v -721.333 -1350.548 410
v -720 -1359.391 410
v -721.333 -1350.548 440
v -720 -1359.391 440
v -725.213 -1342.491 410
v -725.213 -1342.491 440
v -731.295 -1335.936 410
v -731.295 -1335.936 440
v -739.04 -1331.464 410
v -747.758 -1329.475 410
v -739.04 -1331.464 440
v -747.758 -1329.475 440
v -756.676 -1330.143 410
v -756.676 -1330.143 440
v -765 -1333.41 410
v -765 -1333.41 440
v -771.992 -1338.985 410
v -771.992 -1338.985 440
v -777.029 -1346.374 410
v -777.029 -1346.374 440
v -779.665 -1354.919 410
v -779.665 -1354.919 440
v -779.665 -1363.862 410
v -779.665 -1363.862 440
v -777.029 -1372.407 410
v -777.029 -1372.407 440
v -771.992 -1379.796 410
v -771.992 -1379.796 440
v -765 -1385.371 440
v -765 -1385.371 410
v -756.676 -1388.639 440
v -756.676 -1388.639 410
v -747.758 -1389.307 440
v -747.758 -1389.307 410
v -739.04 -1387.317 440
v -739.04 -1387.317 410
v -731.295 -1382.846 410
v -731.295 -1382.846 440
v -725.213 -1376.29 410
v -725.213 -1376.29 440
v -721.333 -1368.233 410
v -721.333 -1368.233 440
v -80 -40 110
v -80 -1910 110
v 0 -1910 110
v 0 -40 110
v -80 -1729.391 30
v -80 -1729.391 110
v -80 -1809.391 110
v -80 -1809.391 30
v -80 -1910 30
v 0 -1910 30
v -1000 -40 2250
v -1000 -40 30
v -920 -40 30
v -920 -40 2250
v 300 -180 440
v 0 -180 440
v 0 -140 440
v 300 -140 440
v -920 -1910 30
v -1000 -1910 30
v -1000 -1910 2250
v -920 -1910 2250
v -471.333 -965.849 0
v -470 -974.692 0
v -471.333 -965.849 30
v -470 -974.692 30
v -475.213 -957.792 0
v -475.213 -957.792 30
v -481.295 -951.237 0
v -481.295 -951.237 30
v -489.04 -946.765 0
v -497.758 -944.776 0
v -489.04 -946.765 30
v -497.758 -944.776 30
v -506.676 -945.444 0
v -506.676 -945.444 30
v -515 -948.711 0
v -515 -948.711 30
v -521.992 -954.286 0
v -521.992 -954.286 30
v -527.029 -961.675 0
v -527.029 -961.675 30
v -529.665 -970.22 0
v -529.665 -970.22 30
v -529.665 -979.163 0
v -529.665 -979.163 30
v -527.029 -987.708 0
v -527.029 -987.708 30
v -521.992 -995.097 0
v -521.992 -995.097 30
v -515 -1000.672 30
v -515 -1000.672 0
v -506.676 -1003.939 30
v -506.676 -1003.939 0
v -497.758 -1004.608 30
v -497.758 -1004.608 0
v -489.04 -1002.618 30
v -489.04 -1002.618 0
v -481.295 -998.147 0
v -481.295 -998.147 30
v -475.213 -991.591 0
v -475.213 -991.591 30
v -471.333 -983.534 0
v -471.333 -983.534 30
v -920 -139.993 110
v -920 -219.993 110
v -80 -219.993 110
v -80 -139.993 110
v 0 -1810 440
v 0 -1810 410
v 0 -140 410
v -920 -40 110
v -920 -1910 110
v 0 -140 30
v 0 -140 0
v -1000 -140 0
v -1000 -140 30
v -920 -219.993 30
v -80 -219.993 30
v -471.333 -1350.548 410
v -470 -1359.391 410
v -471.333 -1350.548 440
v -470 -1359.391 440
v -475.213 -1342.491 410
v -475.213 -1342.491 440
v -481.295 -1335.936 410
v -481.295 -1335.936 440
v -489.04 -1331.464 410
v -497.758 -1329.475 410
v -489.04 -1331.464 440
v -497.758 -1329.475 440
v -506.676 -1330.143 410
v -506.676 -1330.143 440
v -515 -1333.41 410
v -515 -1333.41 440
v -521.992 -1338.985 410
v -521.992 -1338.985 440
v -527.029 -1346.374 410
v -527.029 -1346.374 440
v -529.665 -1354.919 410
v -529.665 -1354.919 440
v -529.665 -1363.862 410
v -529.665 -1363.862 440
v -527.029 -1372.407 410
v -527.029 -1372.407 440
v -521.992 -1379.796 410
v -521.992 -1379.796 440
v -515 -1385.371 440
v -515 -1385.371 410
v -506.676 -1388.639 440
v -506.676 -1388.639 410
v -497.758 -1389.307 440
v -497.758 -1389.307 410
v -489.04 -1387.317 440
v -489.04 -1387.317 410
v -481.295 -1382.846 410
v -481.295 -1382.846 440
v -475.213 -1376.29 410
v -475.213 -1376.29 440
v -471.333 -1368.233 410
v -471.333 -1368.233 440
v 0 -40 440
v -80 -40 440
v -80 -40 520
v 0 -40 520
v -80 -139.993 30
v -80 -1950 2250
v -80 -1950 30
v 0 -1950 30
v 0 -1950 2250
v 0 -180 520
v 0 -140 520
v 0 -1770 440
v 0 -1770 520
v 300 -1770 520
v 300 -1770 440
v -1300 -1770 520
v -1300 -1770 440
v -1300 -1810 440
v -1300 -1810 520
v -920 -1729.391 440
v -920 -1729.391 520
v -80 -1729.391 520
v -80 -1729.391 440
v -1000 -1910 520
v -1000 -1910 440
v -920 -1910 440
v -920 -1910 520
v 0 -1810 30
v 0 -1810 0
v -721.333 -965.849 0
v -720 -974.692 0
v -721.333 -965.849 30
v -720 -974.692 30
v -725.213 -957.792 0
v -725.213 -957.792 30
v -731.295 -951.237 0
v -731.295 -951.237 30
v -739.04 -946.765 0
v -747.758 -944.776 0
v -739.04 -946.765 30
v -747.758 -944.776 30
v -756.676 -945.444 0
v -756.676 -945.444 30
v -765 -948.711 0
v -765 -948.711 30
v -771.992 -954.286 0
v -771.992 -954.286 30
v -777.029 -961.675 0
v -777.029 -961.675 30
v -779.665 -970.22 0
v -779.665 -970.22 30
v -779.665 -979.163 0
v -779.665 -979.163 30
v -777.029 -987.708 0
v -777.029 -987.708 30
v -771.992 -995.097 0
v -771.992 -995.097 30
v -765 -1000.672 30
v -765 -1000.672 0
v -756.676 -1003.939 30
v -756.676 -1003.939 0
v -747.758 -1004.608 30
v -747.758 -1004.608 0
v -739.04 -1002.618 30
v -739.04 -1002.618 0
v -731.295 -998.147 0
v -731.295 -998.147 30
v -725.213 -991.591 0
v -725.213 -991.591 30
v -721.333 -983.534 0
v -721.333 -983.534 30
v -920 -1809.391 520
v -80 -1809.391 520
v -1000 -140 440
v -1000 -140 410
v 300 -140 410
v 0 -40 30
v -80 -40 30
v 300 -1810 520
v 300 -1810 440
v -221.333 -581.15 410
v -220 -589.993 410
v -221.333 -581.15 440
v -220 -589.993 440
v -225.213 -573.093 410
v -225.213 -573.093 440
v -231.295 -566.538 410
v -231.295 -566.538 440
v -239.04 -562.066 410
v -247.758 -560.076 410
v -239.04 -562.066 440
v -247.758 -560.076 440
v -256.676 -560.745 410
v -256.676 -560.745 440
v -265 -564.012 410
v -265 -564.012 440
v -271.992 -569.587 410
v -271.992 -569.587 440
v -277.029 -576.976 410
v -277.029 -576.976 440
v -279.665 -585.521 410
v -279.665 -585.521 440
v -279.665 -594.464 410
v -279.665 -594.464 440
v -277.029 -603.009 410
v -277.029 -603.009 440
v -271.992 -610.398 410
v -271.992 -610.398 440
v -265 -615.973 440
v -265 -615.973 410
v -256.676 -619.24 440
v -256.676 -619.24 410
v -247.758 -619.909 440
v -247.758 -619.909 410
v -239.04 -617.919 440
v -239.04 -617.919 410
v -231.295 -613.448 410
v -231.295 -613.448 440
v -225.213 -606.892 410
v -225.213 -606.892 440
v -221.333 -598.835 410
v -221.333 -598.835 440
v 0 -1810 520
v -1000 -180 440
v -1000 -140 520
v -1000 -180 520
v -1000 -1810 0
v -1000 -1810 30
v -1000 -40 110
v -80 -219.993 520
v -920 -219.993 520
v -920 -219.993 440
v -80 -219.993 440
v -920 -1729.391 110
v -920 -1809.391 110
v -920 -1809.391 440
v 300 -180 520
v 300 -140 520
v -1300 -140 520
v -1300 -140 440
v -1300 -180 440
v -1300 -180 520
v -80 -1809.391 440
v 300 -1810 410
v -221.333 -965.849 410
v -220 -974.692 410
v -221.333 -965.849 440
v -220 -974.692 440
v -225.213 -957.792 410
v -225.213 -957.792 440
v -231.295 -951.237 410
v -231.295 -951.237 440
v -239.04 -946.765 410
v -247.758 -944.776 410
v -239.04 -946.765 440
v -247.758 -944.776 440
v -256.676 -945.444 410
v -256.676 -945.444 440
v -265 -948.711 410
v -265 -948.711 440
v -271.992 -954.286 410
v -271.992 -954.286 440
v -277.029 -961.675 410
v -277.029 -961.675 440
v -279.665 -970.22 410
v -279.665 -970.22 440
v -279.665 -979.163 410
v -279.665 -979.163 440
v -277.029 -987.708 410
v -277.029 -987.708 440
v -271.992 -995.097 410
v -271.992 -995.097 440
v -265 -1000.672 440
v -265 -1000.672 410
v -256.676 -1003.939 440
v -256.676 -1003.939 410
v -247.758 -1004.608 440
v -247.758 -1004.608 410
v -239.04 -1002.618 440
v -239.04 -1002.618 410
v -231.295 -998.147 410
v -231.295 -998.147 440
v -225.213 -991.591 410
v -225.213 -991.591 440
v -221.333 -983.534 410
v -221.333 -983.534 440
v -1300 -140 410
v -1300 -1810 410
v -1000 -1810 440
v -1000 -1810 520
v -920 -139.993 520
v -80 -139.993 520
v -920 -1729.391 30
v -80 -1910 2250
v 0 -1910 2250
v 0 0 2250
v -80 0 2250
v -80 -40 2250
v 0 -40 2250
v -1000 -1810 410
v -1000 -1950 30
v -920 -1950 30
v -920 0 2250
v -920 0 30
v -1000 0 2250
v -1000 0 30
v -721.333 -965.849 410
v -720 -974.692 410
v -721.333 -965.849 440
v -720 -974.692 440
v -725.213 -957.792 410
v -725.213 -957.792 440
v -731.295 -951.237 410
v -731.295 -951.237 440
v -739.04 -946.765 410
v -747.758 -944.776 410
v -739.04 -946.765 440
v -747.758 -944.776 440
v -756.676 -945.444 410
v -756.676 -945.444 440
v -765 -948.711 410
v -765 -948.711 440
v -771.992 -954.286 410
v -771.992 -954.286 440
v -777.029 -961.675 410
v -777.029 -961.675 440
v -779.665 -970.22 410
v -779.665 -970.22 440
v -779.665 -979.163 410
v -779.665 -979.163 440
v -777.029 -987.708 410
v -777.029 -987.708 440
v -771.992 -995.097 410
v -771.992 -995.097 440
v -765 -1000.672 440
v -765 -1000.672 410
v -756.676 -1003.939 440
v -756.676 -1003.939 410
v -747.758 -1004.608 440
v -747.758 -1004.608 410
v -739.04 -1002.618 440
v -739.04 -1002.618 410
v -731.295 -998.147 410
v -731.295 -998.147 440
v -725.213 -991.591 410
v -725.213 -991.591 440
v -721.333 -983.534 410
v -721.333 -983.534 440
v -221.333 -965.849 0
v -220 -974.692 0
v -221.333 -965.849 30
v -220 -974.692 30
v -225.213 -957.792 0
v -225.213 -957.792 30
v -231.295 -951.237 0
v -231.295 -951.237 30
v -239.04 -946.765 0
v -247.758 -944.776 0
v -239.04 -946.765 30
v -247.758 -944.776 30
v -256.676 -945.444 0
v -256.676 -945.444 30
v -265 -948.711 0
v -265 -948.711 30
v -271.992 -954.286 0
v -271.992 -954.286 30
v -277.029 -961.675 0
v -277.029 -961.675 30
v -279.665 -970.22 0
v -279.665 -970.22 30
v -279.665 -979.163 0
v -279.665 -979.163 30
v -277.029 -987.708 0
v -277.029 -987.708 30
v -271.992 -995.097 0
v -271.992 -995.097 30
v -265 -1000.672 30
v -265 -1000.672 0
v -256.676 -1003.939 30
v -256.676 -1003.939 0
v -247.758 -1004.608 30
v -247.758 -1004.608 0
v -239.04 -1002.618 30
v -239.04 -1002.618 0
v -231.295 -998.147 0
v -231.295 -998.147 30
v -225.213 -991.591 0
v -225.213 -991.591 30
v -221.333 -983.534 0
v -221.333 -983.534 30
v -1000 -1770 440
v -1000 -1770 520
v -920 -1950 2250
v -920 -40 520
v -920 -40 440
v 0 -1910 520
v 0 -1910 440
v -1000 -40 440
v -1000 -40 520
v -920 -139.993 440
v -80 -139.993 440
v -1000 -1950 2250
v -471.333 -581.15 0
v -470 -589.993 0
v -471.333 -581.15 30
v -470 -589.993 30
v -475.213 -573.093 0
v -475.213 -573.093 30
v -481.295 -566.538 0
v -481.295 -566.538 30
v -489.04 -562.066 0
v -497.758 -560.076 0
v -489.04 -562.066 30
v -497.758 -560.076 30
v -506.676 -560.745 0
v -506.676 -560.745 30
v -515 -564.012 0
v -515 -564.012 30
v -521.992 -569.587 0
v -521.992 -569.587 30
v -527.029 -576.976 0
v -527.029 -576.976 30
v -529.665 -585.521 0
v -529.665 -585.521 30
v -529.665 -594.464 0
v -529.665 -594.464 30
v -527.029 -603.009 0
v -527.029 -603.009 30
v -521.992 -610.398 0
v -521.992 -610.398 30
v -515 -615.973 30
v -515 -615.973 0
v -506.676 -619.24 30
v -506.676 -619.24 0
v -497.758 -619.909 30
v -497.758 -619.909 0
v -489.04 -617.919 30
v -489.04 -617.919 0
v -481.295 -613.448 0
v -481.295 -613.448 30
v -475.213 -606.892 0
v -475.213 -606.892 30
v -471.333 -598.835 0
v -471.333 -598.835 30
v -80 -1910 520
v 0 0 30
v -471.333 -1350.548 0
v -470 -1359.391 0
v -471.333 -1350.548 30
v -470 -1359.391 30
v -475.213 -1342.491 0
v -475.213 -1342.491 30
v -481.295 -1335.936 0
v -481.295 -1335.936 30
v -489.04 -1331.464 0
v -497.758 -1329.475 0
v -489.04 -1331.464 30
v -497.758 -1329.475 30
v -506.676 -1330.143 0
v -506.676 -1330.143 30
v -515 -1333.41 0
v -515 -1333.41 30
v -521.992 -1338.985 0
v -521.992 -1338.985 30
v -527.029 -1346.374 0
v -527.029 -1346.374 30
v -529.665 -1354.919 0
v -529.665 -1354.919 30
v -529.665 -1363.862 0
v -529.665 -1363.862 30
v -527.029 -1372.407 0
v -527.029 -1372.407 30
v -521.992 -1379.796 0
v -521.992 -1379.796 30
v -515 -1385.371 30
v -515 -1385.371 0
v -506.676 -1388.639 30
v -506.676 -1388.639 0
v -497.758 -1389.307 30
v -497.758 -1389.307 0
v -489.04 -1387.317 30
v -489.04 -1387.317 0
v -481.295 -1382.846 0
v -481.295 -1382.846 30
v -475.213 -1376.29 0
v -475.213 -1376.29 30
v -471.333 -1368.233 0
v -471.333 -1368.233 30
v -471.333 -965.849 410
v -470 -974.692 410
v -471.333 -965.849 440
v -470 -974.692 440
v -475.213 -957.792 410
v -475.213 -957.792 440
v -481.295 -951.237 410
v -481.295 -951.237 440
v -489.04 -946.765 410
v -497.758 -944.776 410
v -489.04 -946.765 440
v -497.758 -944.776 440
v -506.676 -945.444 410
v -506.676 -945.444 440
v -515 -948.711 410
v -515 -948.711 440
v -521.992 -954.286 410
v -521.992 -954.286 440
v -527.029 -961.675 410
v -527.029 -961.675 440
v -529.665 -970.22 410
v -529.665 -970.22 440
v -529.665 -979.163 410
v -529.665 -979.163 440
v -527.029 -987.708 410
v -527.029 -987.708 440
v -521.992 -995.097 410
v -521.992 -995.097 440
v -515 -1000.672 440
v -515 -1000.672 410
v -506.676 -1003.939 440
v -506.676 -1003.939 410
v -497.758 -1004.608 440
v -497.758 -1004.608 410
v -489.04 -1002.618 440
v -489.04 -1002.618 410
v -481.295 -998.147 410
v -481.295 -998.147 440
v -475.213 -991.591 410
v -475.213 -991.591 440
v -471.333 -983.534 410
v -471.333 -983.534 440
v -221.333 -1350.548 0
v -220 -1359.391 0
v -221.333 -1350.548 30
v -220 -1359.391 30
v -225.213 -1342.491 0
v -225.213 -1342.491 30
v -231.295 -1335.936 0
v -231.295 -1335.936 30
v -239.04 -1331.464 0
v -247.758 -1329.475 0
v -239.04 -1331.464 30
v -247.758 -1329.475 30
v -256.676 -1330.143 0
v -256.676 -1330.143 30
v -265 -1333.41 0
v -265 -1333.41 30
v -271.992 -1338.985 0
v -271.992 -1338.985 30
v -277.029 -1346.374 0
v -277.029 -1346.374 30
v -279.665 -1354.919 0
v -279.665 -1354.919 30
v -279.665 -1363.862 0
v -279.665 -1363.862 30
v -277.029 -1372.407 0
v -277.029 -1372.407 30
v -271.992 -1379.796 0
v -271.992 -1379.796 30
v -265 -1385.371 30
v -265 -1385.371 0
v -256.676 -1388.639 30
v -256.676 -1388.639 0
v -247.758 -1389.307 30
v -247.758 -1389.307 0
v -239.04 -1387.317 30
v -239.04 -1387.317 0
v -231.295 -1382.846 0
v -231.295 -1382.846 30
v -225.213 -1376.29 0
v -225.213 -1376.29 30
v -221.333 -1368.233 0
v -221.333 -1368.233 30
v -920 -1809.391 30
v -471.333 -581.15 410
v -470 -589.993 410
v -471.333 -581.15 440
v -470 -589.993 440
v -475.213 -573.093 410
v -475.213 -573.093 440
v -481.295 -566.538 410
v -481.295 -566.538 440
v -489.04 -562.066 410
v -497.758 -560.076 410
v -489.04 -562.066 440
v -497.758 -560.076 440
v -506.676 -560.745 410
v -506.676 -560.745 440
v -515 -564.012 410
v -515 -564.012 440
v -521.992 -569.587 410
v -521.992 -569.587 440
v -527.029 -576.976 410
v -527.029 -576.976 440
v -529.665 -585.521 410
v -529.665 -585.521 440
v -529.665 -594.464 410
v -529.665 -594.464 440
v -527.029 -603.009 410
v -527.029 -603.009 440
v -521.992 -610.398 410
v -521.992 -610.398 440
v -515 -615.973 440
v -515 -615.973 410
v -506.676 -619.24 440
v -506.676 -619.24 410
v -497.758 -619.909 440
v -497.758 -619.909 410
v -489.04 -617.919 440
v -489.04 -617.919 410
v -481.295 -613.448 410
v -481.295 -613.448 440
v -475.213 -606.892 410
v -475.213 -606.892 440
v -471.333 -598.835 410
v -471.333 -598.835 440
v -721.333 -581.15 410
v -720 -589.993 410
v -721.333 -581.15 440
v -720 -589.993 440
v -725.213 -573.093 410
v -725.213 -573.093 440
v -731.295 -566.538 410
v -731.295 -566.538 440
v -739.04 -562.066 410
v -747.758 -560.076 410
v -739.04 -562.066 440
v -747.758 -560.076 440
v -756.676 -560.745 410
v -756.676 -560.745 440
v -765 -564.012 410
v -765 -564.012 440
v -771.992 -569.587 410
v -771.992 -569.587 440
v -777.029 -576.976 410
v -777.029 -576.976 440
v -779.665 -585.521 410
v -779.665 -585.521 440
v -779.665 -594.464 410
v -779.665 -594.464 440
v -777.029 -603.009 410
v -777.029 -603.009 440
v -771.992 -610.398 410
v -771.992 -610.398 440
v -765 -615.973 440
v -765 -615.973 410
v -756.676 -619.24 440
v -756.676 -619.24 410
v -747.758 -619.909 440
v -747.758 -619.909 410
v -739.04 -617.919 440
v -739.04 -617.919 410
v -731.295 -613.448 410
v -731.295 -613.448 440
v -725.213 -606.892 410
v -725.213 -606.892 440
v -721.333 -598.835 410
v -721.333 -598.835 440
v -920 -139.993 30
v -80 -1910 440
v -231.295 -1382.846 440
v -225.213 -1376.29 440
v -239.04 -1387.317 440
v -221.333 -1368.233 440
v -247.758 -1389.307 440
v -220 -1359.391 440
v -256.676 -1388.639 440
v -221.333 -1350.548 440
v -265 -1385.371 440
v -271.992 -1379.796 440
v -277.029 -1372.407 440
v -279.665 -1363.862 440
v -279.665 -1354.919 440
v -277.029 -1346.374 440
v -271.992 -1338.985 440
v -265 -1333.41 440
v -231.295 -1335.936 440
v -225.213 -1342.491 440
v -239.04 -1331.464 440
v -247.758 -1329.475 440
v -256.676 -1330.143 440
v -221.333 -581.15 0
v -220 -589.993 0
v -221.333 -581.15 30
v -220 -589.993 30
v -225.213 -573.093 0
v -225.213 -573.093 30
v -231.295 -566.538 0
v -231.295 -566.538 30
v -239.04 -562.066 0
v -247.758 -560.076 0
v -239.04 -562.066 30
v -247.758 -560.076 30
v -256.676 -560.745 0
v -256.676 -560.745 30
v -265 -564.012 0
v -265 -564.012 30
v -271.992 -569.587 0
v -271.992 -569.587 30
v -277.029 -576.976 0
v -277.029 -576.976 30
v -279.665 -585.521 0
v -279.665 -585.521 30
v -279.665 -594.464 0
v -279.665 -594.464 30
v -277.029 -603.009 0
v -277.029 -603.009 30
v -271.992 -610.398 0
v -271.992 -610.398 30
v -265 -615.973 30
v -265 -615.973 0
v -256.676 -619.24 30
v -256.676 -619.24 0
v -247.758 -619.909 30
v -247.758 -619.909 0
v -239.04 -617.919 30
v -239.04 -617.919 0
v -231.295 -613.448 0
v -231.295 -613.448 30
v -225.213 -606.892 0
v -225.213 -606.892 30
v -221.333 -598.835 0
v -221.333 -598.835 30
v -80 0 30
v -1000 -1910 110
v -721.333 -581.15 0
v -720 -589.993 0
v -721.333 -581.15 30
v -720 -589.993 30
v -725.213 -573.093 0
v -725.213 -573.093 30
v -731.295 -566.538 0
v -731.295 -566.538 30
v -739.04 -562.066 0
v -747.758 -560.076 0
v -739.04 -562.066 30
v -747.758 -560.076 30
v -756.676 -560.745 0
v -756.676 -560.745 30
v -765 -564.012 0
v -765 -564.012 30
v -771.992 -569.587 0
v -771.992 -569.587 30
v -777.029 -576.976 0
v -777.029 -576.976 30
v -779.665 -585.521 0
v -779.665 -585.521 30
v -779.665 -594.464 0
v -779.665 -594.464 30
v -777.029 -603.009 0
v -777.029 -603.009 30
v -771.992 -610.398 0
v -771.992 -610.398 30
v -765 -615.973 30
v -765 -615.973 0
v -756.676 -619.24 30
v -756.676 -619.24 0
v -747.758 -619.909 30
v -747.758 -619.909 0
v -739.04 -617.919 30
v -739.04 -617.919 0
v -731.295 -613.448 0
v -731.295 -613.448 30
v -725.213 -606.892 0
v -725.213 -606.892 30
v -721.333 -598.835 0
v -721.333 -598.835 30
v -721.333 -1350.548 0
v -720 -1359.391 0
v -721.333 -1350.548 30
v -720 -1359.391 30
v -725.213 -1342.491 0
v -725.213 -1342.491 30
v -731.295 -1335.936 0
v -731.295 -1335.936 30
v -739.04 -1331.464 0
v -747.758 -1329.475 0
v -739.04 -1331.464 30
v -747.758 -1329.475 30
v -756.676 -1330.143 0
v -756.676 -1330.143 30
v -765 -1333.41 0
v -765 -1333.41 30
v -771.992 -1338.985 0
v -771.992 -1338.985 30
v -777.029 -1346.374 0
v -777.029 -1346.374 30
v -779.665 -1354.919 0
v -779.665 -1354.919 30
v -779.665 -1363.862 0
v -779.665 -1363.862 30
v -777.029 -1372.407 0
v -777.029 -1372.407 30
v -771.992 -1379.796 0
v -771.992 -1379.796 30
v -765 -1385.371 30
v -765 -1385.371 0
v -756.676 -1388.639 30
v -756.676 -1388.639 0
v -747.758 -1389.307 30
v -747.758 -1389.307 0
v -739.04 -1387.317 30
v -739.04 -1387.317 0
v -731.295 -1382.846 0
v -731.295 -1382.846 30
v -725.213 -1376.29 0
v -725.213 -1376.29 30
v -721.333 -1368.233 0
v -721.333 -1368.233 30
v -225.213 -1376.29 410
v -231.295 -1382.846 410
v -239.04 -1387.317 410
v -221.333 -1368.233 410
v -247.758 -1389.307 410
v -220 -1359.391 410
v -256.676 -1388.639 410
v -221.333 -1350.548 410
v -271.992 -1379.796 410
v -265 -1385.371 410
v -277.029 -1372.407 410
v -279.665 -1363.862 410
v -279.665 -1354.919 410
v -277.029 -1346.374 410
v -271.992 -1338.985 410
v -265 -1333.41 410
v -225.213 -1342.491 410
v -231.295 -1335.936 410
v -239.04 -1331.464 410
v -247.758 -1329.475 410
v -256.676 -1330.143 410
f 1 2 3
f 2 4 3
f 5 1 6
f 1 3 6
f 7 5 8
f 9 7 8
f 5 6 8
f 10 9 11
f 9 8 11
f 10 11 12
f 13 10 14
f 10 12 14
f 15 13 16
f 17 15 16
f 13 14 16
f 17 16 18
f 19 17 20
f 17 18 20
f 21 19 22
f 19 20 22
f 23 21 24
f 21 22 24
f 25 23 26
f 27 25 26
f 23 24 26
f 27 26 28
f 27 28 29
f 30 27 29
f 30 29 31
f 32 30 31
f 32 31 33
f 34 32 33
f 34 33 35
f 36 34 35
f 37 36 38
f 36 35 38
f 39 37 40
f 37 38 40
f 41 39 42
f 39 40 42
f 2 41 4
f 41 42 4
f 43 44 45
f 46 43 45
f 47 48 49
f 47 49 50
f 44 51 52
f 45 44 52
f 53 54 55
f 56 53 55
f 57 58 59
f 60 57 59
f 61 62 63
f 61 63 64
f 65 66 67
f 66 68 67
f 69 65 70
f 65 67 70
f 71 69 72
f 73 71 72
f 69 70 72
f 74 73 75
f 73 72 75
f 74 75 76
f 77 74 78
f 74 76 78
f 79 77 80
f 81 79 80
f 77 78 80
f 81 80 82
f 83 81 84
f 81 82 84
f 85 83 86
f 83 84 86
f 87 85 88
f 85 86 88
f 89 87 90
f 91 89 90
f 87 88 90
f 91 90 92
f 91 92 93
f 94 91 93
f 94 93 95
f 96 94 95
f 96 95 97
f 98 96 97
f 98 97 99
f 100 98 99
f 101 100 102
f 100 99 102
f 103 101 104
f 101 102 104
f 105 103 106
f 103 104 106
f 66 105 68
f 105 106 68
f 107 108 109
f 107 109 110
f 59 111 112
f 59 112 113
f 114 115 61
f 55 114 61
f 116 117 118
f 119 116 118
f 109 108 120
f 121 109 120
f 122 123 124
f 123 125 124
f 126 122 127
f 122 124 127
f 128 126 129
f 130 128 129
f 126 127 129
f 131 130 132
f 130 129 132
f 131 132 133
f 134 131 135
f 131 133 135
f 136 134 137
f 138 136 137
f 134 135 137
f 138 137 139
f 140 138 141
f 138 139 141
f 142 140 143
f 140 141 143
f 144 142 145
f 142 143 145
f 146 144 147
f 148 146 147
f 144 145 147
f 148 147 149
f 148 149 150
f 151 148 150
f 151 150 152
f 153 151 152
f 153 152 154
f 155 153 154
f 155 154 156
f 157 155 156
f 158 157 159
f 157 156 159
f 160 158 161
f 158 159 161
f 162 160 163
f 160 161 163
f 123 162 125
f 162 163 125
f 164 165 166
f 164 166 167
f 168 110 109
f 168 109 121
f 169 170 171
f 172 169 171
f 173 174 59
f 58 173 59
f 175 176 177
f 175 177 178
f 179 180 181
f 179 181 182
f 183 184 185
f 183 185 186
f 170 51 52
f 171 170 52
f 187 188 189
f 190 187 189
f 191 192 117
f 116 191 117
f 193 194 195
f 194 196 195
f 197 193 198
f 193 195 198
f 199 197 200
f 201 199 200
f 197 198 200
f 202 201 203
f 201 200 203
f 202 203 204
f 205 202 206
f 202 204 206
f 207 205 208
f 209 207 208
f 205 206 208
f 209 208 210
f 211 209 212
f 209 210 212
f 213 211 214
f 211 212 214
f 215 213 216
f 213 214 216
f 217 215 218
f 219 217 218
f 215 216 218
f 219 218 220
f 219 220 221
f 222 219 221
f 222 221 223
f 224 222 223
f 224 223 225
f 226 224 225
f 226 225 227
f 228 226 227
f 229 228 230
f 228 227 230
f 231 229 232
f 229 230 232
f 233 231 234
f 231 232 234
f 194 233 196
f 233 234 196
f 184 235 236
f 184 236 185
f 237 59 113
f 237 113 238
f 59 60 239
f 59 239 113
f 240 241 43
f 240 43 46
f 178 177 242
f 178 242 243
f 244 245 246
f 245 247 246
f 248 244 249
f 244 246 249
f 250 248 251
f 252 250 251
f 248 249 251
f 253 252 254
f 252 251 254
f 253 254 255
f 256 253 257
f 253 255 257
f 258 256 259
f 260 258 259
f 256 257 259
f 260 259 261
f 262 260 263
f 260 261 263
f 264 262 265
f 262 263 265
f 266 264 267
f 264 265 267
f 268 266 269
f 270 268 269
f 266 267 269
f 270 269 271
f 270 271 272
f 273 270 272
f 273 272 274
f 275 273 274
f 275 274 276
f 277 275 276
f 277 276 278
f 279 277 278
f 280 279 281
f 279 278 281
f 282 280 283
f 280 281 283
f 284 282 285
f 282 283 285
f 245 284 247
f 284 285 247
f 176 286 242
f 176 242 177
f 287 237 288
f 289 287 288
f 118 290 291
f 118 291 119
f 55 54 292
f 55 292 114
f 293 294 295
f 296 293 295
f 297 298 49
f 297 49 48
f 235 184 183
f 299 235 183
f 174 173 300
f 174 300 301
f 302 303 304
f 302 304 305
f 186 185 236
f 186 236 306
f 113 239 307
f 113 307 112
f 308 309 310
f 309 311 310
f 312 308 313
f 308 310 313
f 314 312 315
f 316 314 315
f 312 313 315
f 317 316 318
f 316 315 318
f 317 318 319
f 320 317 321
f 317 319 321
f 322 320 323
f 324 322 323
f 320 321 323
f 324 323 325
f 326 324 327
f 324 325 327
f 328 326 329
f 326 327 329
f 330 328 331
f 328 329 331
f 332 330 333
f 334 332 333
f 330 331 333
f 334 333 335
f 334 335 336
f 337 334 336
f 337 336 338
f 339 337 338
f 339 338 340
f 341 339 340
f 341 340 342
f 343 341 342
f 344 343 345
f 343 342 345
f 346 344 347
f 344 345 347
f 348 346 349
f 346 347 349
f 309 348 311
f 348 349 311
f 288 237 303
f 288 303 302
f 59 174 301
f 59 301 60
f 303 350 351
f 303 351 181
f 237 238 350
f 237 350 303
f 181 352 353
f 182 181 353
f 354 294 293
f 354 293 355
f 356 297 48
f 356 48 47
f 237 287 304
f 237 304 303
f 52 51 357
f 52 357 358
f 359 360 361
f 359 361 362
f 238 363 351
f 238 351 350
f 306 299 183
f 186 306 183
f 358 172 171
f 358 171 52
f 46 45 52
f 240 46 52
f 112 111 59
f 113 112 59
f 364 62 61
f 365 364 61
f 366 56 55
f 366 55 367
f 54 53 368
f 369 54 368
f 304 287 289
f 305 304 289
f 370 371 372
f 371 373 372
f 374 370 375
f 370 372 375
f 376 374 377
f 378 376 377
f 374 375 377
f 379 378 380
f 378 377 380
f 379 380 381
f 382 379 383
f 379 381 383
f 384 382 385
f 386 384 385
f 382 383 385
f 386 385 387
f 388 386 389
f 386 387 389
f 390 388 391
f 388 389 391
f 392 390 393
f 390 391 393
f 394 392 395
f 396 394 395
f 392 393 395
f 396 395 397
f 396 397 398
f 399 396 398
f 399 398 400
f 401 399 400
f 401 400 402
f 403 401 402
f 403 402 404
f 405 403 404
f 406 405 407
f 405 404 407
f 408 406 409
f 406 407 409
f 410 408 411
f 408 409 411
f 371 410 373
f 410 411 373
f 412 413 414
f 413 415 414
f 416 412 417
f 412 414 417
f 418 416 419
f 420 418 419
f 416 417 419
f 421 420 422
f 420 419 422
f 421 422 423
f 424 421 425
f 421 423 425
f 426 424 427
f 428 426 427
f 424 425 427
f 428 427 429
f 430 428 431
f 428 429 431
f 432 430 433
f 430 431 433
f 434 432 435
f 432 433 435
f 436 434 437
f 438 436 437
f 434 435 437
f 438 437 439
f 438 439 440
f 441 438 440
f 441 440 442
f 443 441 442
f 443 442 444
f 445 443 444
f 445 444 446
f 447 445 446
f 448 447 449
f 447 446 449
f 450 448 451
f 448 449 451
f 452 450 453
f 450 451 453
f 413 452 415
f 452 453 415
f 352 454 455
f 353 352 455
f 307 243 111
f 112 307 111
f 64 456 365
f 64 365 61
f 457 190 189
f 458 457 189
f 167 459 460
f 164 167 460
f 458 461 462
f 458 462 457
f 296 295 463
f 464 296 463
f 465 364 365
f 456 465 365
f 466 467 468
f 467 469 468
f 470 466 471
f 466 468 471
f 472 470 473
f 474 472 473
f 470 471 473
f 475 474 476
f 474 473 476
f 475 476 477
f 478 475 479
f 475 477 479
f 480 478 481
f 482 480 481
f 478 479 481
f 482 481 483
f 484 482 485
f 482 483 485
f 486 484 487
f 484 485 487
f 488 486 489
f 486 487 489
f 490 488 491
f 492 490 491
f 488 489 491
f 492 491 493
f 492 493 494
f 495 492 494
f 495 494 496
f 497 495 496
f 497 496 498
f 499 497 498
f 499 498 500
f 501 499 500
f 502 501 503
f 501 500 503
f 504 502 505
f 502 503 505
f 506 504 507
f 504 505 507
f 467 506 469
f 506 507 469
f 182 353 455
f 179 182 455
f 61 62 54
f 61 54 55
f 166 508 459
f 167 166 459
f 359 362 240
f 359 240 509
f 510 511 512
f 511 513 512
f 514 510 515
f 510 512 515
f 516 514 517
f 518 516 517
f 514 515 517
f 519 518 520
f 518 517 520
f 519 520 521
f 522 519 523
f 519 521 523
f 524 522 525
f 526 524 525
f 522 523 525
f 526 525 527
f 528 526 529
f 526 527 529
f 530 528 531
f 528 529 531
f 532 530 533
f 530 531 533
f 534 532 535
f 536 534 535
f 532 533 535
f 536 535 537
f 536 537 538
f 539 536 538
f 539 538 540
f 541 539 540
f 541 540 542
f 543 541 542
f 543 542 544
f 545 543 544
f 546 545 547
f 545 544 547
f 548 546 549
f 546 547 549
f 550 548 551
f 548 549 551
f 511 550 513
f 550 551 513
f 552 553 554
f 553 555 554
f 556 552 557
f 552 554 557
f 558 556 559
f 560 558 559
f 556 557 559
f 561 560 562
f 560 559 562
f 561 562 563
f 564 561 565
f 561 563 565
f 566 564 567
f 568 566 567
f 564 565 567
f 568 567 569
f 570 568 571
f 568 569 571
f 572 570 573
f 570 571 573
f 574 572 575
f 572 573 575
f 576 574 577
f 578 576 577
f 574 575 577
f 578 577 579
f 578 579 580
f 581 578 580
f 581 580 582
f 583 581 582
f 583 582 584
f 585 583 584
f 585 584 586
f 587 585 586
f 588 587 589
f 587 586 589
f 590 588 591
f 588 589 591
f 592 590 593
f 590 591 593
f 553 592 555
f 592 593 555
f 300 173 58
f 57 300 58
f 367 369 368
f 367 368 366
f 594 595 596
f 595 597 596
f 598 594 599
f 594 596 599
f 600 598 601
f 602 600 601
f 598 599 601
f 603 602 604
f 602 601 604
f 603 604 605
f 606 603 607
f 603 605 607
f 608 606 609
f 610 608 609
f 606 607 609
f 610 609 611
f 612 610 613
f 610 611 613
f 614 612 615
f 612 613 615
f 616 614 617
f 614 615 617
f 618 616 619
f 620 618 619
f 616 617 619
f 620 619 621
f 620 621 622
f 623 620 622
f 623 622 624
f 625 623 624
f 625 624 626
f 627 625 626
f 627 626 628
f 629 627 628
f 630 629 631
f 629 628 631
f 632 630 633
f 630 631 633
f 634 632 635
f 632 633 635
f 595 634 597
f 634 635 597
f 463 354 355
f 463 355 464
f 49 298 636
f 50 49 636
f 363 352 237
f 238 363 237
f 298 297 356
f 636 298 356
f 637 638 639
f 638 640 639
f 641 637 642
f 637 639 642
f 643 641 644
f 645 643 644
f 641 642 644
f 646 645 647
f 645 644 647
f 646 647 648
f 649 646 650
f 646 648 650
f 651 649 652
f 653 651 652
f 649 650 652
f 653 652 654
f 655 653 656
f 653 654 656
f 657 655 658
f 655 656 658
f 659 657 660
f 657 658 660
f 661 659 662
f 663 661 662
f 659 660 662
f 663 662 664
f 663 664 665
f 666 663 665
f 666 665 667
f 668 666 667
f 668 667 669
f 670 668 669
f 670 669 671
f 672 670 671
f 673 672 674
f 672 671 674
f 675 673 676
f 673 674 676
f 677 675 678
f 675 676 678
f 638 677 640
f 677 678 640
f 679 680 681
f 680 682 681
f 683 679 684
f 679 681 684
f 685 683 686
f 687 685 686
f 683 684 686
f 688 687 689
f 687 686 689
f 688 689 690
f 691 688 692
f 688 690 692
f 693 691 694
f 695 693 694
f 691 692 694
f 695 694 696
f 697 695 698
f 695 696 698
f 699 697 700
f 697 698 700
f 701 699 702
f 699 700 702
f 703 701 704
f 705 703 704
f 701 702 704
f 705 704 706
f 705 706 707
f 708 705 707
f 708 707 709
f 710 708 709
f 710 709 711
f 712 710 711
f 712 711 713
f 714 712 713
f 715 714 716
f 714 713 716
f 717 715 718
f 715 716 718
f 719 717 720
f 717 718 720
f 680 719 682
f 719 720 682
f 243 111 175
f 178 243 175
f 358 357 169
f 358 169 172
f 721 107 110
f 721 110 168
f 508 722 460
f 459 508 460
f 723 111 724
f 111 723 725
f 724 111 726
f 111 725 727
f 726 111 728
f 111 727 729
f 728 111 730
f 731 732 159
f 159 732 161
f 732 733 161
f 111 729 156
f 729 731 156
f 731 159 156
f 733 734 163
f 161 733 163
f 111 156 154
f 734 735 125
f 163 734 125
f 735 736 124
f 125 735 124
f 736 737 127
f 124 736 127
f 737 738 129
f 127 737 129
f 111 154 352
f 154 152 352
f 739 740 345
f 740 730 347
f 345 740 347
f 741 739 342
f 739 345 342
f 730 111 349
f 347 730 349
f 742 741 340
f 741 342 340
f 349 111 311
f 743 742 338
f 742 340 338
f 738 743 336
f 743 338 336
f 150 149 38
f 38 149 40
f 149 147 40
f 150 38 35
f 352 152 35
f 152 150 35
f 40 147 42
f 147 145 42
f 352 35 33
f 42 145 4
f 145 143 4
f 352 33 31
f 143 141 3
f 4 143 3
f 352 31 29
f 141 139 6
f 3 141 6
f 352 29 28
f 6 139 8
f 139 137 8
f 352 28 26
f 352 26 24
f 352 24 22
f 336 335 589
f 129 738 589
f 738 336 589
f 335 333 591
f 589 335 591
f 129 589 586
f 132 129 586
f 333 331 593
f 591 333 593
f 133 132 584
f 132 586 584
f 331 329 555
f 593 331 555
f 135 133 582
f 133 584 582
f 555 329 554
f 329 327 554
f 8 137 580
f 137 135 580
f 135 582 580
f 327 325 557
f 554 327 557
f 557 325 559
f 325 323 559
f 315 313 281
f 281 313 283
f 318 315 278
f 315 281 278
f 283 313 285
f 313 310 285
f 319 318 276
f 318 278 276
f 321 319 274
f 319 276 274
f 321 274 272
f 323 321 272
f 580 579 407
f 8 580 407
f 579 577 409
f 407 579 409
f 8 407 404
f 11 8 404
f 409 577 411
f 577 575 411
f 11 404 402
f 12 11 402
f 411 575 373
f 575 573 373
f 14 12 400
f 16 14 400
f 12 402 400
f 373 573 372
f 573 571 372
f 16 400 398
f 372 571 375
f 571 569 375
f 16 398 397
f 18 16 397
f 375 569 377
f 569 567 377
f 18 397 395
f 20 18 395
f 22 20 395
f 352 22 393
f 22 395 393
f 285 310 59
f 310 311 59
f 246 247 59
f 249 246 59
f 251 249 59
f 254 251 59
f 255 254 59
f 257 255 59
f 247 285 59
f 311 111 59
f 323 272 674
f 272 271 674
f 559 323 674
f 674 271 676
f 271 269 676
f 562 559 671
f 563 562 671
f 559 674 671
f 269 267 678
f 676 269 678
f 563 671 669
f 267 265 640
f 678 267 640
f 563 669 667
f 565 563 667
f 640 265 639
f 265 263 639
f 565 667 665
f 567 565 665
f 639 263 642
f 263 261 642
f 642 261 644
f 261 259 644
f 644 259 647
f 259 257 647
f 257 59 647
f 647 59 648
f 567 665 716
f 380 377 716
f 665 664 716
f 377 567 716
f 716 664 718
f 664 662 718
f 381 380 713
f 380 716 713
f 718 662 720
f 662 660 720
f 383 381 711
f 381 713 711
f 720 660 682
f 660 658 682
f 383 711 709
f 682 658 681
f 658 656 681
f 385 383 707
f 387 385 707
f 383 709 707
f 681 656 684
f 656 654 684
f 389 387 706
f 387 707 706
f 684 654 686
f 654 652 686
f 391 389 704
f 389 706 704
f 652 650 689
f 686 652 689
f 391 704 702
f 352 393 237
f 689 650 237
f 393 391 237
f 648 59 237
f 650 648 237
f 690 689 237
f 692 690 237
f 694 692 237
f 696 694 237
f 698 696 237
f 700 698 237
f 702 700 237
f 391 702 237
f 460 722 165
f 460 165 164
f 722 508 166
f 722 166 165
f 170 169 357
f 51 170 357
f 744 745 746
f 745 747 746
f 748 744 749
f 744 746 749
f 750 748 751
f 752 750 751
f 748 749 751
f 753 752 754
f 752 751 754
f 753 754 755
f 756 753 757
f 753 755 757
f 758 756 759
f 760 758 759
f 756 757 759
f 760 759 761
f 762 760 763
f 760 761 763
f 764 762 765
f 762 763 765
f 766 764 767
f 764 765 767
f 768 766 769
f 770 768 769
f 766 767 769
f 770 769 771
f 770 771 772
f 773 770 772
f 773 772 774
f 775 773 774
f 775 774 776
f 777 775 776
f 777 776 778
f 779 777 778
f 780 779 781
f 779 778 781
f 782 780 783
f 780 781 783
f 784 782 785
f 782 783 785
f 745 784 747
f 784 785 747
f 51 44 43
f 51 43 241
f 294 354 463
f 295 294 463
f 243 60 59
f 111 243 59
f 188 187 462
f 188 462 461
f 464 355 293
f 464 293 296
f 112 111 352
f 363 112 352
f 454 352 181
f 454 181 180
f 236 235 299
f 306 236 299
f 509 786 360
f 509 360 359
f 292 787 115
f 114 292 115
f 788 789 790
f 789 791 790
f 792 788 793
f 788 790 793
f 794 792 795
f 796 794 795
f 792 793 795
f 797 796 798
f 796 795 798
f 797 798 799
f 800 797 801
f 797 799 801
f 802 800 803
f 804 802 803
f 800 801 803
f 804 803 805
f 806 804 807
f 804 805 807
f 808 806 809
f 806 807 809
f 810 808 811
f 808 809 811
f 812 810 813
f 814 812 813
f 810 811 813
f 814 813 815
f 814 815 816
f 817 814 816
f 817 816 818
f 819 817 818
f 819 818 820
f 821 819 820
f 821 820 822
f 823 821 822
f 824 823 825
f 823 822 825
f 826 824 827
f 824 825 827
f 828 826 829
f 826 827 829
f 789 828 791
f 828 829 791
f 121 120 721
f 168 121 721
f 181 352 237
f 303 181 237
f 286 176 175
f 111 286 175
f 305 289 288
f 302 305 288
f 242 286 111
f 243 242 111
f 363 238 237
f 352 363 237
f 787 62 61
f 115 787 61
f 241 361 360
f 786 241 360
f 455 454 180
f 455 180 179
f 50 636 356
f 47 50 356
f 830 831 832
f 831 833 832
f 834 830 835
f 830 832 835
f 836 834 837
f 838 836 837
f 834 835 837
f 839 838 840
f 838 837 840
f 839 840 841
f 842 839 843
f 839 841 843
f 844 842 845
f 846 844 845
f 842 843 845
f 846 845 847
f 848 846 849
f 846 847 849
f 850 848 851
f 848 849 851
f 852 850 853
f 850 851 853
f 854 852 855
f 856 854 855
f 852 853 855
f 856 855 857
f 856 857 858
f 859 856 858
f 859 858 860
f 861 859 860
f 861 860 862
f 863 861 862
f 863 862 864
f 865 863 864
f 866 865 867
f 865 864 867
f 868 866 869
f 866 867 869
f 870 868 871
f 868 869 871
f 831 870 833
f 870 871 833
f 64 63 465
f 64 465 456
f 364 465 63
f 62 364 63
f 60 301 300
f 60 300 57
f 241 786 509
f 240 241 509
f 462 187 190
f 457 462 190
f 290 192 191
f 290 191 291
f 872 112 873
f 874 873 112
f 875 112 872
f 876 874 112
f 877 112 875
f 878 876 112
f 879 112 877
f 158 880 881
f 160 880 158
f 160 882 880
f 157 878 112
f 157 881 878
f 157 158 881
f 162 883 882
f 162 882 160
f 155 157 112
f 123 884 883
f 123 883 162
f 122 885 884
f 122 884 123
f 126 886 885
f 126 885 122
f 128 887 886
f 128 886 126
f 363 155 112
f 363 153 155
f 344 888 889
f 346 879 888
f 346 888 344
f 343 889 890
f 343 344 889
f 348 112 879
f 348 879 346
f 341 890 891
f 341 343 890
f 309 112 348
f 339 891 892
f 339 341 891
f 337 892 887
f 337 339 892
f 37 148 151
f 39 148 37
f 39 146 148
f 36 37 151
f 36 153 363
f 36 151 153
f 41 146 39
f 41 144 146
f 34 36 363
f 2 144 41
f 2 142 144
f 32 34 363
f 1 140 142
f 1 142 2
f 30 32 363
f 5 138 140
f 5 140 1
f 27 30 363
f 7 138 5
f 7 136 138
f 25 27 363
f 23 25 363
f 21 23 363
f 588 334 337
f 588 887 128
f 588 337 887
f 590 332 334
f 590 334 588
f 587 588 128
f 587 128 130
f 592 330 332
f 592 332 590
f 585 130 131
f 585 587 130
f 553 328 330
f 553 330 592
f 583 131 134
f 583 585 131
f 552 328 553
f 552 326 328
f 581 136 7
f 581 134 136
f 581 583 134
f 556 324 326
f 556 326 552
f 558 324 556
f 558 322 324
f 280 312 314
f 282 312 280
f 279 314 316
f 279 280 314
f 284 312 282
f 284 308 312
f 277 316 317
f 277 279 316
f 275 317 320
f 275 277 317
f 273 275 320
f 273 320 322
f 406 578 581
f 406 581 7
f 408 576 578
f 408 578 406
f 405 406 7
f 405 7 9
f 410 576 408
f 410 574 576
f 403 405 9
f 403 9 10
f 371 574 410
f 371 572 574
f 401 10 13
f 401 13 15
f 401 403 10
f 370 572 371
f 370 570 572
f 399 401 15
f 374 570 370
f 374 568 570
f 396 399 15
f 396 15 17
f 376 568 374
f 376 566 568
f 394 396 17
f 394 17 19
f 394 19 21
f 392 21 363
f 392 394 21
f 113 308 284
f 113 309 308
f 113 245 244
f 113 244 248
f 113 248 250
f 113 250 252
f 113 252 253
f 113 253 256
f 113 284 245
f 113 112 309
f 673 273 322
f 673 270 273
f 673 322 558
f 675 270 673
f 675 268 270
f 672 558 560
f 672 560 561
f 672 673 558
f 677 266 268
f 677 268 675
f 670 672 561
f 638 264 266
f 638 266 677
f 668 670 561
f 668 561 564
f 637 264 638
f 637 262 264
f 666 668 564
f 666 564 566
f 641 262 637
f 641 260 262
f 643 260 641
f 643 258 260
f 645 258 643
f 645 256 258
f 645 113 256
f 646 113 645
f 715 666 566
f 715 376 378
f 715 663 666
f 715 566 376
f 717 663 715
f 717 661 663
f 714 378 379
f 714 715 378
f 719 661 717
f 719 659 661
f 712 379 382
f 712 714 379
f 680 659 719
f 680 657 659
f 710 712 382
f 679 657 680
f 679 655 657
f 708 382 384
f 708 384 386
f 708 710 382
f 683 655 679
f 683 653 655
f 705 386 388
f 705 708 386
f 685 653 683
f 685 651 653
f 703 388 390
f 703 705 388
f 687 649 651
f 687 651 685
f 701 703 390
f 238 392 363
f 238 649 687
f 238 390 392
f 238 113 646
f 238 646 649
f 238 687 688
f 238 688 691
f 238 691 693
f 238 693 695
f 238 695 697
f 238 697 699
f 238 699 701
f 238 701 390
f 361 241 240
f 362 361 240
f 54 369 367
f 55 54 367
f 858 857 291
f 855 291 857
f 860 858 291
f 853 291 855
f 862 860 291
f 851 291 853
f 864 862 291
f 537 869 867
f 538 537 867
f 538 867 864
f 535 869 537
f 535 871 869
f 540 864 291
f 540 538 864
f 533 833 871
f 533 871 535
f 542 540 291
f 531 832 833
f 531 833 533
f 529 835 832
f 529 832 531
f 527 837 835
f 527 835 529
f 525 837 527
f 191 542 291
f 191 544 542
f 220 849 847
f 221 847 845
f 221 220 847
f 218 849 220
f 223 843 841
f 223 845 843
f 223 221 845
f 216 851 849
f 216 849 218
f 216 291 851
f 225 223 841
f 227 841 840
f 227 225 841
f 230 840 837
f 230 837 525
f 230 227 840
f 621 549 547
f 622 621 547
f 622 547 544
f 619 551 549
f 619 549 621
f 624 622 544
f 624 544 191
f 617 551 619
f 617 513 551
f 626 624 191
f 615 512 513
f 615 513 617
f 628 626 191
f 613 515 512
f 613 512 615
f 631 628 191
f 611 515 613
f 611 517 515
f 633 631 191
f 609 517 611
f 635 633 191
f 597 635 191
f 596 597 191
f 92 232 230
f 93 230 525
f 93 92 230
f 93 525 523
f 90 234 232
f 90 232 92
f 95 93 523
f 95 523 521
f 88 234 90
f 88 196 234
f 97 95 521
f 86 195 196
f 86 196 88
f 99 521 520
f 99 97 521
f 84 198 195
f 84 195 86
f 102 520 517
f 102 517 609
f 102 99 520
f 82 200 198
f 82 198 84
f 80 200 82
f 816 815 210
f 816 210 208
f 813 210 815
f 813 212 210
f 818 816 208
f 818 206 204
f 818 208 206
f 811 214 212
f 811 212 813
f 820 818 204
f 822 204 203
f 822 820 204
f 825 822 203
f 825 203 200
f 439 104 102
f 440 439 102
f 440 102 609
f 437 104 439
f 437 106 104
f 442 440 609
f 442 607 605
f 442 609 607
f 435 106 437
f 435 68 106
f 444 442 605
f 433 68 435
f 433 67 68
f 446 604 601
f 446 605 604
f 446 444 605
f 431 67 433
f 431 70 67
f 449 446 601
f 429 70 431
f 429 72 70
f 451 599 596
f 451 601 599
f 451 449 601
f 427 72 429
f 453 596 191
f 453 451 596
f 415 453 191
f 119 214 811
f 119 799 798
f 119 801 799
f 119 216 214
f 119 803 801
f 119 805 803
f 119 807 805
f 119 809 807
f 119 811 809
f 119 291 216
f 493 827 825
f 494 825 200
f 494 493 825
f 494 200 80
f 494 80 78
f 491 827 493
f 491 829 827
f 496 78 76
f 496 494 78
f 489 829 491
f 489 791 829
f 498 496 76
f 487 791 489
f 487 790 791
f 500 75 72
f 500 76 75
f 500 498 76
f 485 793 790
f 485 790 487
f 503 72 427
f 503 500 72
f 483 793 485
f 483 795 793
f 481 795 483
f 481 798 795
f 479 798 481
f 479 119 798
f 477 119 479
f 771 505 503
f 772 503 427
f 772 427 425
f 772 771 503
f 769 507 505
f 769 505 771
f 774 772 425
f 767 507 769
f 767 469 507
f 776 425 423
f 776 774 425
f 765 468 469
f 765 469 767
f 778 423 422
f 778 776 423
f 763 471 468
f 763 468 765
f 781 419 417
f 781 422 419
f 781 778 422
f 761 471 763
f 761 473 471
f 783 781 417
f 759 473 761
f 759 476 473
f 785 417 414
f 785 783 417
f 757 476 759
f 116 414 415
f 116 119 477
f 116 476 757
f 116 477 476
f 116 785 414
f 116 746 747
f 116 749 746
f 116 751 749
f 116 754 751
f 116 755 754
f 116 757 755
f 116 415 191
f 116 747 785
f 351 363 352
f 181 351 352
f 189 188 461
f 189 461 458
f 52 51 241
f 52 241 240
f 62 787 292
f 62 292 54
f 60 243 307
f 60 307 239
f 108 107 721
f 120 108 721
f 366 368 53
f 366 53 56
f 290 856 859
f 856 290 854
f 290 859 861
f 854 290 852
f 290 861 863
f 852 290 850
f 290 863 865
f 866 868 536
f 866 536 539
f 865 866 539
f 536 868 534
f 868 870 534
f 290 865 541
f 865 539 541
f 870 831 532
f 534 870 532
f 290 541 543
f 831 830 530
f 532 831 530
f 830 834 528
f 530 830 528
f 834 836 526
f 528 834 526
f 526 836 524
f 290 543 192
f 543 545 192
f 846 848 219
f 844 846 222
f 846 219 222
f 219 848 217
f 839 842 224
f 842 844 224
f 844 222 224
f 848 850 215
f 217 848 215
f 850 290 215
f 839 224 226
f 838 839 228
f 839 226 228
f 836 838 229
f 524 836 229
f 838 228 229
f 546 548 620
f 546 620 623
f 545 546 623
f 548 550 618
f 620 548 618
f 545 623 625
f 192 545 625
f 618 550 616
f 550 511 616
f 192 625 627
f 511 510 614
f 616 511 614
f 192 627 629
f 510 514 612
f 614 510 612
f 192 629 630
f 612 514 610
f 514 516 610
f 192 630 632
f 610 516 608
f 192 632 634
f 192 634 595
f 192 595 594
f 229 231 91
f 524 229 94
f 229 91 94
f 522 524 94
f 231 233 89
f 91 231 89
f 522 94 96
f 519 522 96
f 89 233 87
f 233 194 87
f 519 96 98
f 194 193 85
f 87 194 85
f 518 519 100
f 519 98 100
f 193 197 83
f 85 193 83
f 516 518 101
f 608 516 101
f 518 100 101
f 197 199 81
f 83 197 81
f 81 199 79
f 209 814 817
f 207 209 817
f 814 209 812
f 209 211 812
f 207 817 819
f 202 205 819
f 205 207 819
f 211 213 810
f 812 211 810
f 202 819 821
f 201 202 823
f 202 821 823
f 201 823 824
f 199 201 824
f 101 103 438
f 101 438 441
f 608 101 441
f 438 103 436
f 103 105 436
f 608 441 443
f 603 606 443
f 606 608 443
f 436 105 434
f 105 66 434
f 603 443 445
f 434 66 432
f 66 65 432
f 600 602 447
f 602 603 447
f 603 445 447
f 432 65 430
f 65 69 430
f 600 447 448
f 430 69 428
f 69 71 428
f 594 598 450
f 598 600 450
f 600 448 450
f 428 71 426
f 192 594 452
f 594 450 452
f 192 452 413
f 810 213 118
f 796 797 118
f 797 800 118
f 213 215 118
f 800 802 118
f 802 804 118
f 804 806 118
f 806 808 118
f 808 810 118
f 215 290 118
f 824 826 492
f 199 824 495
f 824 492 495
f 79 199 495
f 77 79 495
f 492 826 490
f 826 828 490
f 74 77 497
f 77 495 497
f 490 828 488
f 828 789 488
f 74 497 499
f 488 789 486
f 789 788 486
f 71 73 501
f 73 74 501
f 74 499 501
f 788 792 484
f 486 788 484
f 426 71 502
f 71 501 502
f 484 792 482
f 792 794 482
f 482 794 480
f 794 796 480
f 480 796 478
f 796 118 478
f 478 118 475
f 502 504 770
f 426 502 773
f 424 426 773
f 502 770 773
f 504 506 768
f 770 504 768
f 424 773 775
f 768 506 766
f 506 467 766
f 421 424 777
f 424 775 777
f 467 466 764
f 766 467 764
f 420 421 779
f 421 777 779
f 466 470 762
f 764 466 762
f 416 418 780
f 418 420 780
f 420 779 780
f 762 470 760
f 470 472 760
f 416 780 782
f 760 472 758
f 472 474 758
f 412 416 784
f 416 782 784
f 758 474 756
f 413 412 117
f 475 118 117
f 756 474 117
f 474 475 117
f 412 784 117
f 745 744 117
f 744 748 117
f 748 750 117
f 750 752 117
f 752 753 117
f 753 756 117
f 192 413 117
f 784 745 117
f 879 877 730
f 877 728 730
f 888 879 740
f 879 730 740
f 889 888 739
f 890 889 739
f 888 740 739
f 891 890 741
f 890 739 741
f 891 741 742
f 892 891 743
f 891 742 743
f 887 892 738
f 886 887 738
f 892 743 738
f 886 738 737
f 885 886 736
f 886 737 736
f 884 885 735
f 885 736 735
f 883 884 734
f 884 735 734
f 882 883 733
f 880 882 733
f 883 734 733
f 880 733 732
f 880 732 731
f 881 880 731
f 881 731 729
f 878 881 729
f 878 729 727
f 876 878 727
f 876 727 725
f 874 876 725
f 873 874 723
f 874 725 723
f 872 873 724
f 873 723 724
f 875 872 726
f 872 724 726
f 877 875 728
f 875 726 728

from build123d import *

# Parameters (mm, degrees)
SKETCH1_W               = 1000
SKETCH1_H               = 1950
BOSS_EXTRUDE1_DEPTH     = 30
SKETCH2_W               = 80
SKETCH2_H               = 40
BOSS_EXTRUDE2_DEPTH     = 2220
BOSS_EXTRUDE2_2_DEPTH   = 2220
BOSS_EXTRUDE2_3_DEPTH   = 2220
BOSS_EXTRUDE2_4_DEPTH   = 2220
SKETCH3_W               = 80
SKETCH3_H               = 80
BOSS_EXTRUDE3_DEPTH     = 1870
BOSS_EXTRUDE3_2_DEPTH   = 1870
SKETCH5_W               = 80
SKETCH5_H               = 80
BOSS_EXTRUDE5_DEPTH     = 1870
BOSS_EXTRUDE5_2_DEPTH   = 1870
SKETCH6_W               = 1000
SKETCH6_H               = 1670
BOSS_EXTRUDE6_DEPTH     = 30
SKETCH7_W               = 80
SKETCH7_H               = 40
BOSS_EXTRUDE7_DEPTH     = 300
BOSS_EXTRUDE7_2_DEPTH   = 300
SKETCH8_W               = 300
SKETCH8_H               = 1670
BOSS_EXTRUDE9_DEPTH     = 30
SKETCH9_W               = 1000
SKETCH9_H               = 140
CUT_EXTRUDE1_DEPTH      = 30
SKETCH11_W              = 80
SKETCH11_H              = 80
BOSS_EXTRUDE10_DEPTH    = 840
BOSS_EXTRUDE10_2_DEPTH  = 840
BOSS_EXTRUDE10_3_DEPTH  = 840
BOSS_EXTRUDE10_4_DEPTH  = 840
SKETCH12_W              = 30
SKETCH12_H              = 1670
BOSS_EXTRUDE11_DEPTH    = 300
SKETCH13_W              = 80
SKETCH13_H              = 40
BOSS_EXTRUDE12_DEPTH    = 300
BOSS_EXTRUDE12_2_DEPTH  = 300
SKETCH14_R              = 30
CUT_EXTRUDE2_DEPTH      = 1811
CUT_EXTRUDE2_DEPTH_BACK = 441


with BuildPart() as part:
    # Sketch1 → Boss-Extrude1 (new body)
    with BuildSketch(Plane.XY):
        with Locations((-500, -975)):
            Rectangle(SKETCH1_W, SKETCH1_H)
    extrude(amount=BOSS_EXTRUDE1_DEPTH)

    # Sketch9 → Cut-Extrude1 (cut)
    with BuildSketch(Plane(origin=(0, 0, 0), x_dir=(-1, 0, 0), z_dir=(0, 0, -1))):
        with Locations((500, -70)):
            Rectangle(SKETCH9_W, SKETCH9_H)
        with Locations((500, -1880)):
            Rectangle(SKETCH9_W, SKETCH9_H)
    extrude(amount=-CUT_EXTRUDE1_DEPTH, mode=Mode.SUBTRACT)


with BuildPart() as body_2:
    # Sketch2 → Boss-Extrude2 (new body)
    with BuildSketch(Plane.XY.offset(30)):
        with Locations((-40, -20)):
            Rectangle(SKETCH2_W, SKETCH2_H)
    extrude(amount=BOSS_EXTRUDE2_DEPTH)


with BuildPart() as body_3:
    # Sketch2 → Boss-Extrude2 2 (new body)
    with BuildSketch(Plane.XY.offset(30)):
        with Locations((-960, -20)):
            Rectangle(SKETCH2_W, SKETCH2_H)
    extrude(amount=BOSS_EXTRUDE2_2_DEPTH)


with BuildPart() as body_4:
    # Sketch2 → Boss-Extrude2 3 (new body)
    with BuildSketch(Plane.XY.offset(30)):
        with Locations((-40, -1930)):
            Rectangle(SKETCH2_W, SKETCH2_H)
    extrude(amount=BOSS_EXTRUDE2_3_DEPTH)


with BuildPart() as body_5:
    # Sketch2 → Boss-Extrude2 4 (new body)
    with BuildSketch(Plane.XY.offset(30)):
        with Locations((-960, -1930)):
            Rectangle(SKETCH2_W, SKETCH2_H)
    extrude(amount=BOSS_EXTRUDE2_4_DEPTH)


with BuildPart() as body_6:
    # Sketch3 → Boss-Extrude3 (new body)
    with BuildSketch(Plane(origin=(0, -1910, 0), x_dir=(1, 0, 0), z_dir=(0, 1, 0))):
        with Locations((-40, -70)):
            Rectangle(SKETCH3_W, SKETCH3_H)
    extrude(amount=BOSS_EXTRUDE3_DEPTH)


with BuildPart() as body_7:
    # Sketch3 → Boss-Extrude3 2 (new body)
    with BuildSketch(Plane(origin=(0, -1910, 0), x_dir=(1, 0, 0), z_dir=(0, 1, 0))):
        with Locations((-960, -70)):
            Rectangle(SKETCH3_W, SKETCH3_H)
    extrude(amount=BOSS_EXTRUDE3_2_DEPTH)


with BuildPart() as body_8:
    # Sketch5 → Boss-Extrude5 (new body)
    with BuildSketch(Plane(origin=(0, -1910, 0), x_dir=(1, 0, 0), z_dir=(0, 1, 0))):
        with Locations((-960, -480)):
            Rectangle(SKETCH5_W, SKETCH5_H)
    extrude(amount=BOSS_EXTRUDE5_DEPTH)


with BuildPart() as body_9:
    # Sketch5 → Boss-Extrude5 2 (new body)
    with BuildSketch(Plane(origin=(0, -1910, 0), x_dir=(1, 0, 0), z_dir=(0, 1, 0))):
        with Locations((-40, -480)):
            Rectangle(SKETCH5_W, SKETCH5_H)
    extrude(amount=BOSS_EXTRUDE5_2_DEPTH)


with BuildPart() as body_10:
    # Sketch6 → Boss-Extrude6 (new body)
    with BuildSketch(Plane(origin=(0, 0, 440), x_dir=(-1, 0, 0), z_dir=(0, 0, -1))):
        with Locations((500, -975)):
            Rectangle(SKETCH6_W, SKETCH6_H)
    extrude(amount=BOSS_EXTRUDE6_DEPTH)


with BuildPart() as body_11:
    # Sketch7 → Boss-Extrude7 (new body)
    with BuildSketch(Plane(origin=(0, 0, 0), x_dir=(0, 0, -1), z_dir=(1, 0, 0))):
        with Locations((-480, -160)):
            Rectangle(SKETCH7_W, SKETCH7_H)
    extrude(amount=BOSS_EXTRUDE7_DEPTH)


with BuildPart() as body_12:
    # Sketch7 → Boss-Extrude7 2 (new body)
    with BuildSketch(Plane(origin=(0, 0, 0), x_dir=(0, 0, -1), z_dir=(1, 0, 0))):
        with Locations((-480, -1790)):
            Rectangle(SKETCH7_W, SKETCH7_H)
    extrude(amount=BOSS_EXTRUDE7_2_DEPTH)


with BuildPart() as body_13:
    # Sketch8 → Boss-Extrude9 (new body)
    with BuildSketch(Plane(origin=(0, 0, 440), x_dir=(-1, 0, 0), z_dir=(0, 0, -1))):
        with Locations((-150, -975)):
            Rectangle(SKETCH8_W, SKETCH8_H)
    extrude(amount=BOSS_EXTRUDE9_DEPTH)


with BuildPart() as body_14:
    # Sketch11 → Boss-Extrude10 (new body)
    with BuildSketch(Plane(origin=(-920, 0, 0), x_dir=(0, 0, -1), z_dir=(1, 0, 0))):
        with Locations((-70, -179.992574532)):
            Rectangle(SKETCH11_W, SKETCH11_H)
    extrude(amount=BOSS_EXTRUDE10_DEPTH)


with BuildPart() as body_15:
    # Sketch11 → Boss-Extrude10 2 (new body)
    with BuildSketch(Plane(origin=(-920, 0, 0), x_dir=(0, 0, -1), z_dir=(1, 0, 0))):
        with Locations((-480, -179.992574532)):
            Rectangle(SKETCH11_W, SKETCH11_H)
    extrude(amount=BOSS_EXTRUDE10_2_DEPTH)


with BuildPart() as body_16:
    # Sketch11 → Boss-Extrude10 3 (new body)
    with BuildSketch(Plane(origin=(-920, 0, 0), x_dir=(0, 0, -1), z_dir=(1, 0, 0))):
        with Locations((-480, -1769.390680485)):
            Rectangle(SKETCH11_W, SKETCH11_H)
    extrude(amount=BOSS_EXTRUDE10_3_DEPTH)


with BuildPart() as body_17:
    # Sketch11 → Boss-Extrude10 4 (new body)
    with BuildSketch(Plane(origin=(-920, 0, 0), x_dir=(0, 0, -1), z_dir=(1, 0, 0))):
        with Locations((-70, -1769.390680485)):
            Rectangle(SKETCH11_W, SKETCH11_H)
    extrude(amount=BOSS_EXTRUDE10_4_DEPTH)


with BuildPart() as body_18:
    # Sketch12 → Boss-Extrude11 (new body)
    with BuildSketch(Plane.ZY.offset(1000)):
        with Locations((425, -975)):
            Rectangle(SKETCH12_W, SKETCH12_H)
    extrude(amount=BOSS_EXTRUDE11_DEPTH)


with BuildPart() as body_19:
    # Sketch13 → Boss-Extrude12 (new body)
    with BuildSketch(Plane.ZY.offset(1000)):
        with Locations((480, -160)):
            Rectangle(SKETCH13_W, SKETCH13_H)
    extrude(amount=BOSS_EXTRUDE12_DEPTH)


with BuildPart() as body_20:
    # Sketch13 → Boss-Extrude12 2 (new body)
    with BuildSketch(Plane.ZY.offset(1000)):
        with Locations((480, -1790)):
            Rectangle(SKETCH13_W, SKETCH13_H)
    extrude(amount=BOSS_EXTRUDE12_2_DEPTH)


with BuildPart() as cut_extrude2_tool:
    # Sketch14 → Cut-Extrude2 (new body, two sides)
    with BuildSketch(Plane.XY.offset(440)) as cut_extrude2_sk:
        with Locations((-750, -589.992574532)):
            Circle(SKETCH14_R)
        with Locations((-500, -589.992574532)):
            Circle(SKETCH14_R)
        with Locations((-250, -589.992574532)):
            Circle(SKETCH14_R)
        with Locations((-500, -974.691627509)):
            Circle(SKETCH14_R)
        with Locations((-250, -974.691627509)):
            Circle(SKETCH14_R)
        with Locations((-500, -1359.390680485)):
            Circle(SKETCH14_R)
        with Locations((-250, -1359.390680485)):
            Circle(SKETCH14_R)
        with Locations((-750, -974.691627509)):
            Circle(SKETCH14_R)
        with Locations((-750, -1359.390680485)):
            Circle(SKETCH14_R)
    extrude(amount=CUT_EXTRUDE2_DEPTH)
    extrude(cut_extrude2_sk.sketch, amount=-CUT_EXTRUDE2_DEPTH_BACK)


with BuildPart() as part_1:
    add(part.part)

    # Cut-Extrude2: cut by cut_extrude2_tool
    add(cut_extrude2_tool.part, mode=Mode.SUBTRACT)


with BuildPart() as body_10_1:
    add(body_10.part)

    # Cut-Extrude2: cut by cut_extrude2_tool
    add(cut_extrude2_tool.part, mode=Mode.SUBTRACT)


solid = Compound([body_2.part, body_3.part, body_4.part, body_5.part, body_6.part, body_7.part, body_8.part, body_9.part, body_11.part, body_12.part, body_13.part, body_14.part, body_15.part, body_16.part, body_17.part, body_18.part, body_19.part, body_20.part, part_1.part, body_10_1.part])
